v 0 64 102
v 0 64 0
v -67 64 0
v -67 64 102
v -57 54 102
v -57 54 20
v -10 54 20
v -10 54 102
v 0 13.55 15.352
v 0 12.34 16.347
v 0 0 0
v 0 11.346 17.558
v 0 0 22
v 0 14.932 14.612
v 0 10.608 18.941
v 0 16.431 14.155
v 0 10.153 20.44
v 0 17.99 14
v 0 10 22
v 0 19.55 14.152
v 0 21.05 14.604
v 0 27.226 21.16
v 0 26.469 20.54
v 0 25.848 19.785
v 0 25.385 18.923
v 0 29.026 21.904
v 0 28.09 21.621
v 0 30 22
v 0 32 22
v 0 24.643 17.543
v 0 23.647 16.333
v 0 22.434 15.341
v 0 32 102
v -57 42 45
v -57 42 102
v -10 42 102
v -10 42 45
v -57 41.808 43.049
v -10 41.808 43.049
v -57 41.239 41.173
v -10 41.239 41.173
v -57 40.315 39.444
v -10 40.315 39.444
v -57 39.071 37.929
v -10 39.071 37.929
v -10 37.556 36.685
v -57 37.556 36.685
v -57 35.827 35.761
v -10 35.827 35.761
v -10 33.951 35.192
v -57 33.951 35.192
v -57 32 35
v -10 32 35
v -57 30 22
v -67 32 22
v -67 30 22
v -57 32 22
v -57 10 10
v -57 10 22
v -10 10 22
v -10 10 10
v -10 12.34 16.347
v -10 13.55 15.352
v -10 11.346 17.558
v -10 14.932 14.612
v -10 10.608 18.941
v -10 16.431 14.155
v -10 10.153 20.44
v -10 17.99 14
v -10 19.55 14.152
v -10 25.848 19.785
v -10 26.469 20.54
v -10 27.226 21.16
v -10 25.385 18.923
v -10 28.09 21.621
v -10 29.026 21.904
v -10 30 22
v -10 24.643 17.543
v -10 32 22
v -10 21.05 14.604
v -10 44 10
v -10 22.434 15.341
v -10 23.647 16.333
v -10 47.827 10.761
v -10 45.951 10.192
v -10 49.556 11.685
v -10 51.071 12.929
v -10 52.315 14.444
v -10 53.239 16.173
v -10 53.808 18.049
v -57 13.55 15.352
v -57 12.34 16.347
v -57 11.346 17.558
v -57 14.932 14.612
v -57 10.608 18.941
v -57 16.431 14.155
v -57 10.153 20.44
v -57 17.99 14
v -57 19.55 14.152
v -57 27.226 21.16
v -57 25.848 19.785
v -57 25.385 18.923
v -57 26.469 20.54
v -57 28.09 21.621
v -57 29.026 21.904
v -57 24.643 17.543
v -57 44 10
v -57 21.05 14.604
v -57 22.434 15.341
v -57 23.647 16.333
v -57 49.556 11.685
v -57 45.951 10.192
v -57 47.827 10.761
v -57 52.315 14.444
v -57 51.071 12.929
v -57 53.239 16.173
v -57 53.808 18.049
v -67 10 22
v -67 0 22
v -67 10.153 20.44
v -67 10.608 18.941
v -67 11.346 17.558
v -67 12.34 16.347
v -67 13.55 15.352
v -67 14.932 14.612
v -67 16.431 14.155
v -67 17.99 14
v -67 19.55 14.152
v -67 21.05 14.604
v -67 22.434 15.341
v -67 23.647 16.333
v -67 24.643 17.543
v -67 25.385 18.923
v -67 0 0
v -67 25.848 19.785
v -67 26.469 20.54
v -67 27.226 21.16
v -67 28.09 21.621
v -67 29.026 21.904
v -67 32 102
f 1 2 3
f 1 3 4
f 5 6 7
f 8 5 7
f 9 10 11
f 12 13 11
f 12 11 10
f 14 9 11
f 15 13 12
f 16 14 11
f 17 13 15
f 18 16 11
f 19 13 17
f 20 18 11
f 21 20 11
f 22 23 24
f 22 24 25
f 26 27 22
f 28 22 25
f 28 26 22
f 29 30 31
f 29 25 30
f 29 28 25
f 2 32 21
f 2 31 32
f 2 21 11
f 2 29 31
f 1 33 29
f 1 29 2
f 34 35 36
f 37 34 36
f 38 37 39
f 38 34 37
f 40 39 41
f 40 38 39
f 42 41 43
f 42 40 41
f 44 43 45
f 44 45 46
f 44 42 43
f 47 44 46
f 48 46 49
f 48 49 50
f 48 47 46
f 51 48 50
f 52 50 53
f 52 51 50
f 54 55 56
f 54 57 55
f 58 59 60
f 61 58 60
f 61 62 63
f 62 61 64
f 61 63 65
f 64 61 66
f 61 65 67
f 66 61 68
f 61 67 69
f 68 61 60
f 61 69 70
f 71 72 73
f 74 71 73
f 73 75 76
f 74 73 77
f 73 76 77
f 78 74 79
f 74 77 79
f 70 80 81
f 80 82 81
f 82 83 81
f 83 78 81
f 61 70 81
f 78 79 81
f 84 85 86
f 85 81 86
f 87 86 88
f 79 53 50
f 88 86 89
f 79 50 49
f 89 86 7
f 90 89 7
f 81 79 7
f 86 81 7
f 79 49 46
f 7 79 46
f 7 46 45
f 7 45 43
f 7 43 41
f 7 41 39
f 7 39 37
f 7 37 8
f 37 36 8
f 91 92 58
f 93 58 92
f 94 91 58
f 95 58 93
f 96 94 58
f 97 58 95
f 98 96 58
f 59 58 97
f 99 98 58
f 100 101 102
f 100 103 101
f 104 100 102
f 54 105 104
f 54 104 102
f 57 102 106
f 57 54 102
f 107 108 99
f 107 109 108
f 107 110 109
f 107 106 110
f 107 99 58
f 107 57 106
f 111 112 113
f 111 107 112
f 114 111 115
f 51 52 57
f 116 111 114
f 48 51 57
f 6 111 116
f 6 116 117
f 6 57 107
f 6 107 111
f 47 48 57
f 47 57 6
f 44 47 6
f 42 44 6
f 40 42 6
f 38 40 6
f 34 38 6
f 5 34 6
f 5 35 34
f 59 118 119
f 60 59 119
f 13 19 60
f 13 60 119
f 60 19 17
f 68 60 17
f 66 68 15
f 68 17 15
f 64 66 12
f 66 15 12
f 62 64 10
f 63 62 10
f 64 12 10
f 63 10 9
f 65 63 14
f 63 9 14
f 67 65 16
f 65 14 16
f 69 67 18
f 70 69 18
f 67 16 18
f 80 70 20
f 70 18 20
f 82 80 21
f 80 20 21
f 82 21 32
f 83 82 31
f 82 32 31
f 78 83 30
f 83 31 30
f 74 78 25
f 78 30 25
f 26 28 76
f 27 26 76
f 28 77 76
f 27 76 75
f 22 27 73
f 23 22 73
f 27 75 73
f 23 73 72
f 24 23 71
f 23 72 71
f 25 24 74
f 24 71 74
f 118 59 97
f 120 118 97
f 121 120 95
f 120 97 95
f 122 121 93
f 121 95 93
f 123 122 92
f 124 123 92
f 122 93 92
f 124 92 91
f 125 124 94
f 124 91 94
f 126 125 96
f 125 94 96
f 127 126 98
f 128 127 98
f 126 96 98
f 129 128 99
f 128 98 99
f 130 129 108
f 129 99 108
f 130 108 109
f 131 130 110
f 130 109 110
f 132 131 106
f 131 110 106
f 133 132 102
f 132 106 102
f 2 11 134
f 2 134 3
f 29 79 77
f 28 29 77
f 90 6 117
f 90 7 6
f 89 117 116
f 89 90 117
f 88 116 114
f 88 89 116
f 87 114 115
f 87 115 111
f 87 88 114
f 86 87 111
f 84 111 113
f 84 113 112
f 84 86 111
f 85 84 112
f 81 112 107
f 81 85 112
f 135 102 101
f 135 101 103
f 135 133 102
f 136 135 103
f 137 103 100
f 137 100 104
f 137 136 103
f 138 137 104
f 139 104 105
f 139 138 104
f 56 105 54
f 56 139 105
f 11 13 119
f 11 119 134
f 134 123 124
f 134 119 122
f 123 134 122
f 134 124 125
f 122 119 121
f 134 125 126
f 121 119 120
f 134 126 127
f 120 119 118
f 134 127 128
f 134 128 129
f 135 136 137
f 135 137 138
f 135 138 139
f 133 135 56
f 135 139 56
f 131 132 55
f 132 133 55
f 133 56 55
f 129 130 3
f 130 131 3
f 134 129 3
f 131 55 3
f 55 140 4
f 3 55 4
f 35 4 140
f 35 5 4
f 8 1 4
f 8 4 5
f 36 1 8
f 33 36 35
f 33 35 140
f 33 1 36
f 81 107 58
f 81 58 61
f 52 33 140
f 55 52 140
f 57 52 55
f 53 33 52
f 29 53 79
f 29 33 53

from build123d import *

# Parameters (mm, degrees)
F1_DEPTH  = 67
F2_W      = 47
F2_H      = 12
F3_DEPTH  = 92
F4_DEPTH  = 92
F5_W      = 47
F5_H      = 22
F6_DEPTH  = 12
F8_DEPTH  = 22
F9_R      = 9.99999
F11_DEPTH = 83
F12_R     = 5


# Not quite as in the source:
# - a fillet or chamfer is up to 0.001 mm smaller than in the source, because OpenCascade refuses the exact size


with BuildPart() as f1:
    # F0 (on Right) → F1 (new body)
    with BuildSketch(Plane.YZ):
        Polygon((0, 22), (0, 0), (64, 0), (64, 22), (64, 102), (32, 102), (32, 22), align=None)
    extrude(amount=-F1_DEPTH)

    # F2 (on face) → F3 (join)
    with BuildSketch(Plane.XY.offset(102)):
        with Locations((-33.5, 48)):
            Rectangle(F2_W, F2_H)
    extrude(amount=-F3_DEPTH)

    # F2 (on face) → F4 (cut)
    with BuildSketch(Plane.XY.offset(102)):
        with Locations((-33.5, 48)):
            Rectangle(F2_W, F2_H)
    extrude(amount=-F4_DEPTH, mode=Mode.SUBTRACT)

    # F5 (on face) → F6 (cut)
    with BuildSketch(Plane.XY.offset(22)):
        with Locations((-33.5, 21)):
            Rectangle(F5_W, F5_H)
    extrude(amount=-F6_DEPTH, mode=Mode.SUBTRACT)

    # F7 (on face) → F8 (cut)
    with BuildSketch(Plane.XZ.offset(-32)):
        Polygon((-57, 22), (-57, 10), (-10, 10), (-10, 22), (-10, 35), (-57, 35), align=None)
    extrude(amount=-F8_DEPTH, mode=Mode.SUBTRACT)

    # F9 (radius 10 in the source; OpenCascade refuses exactly that, so slightly less here)
    f9_edges = [f1.edges().sort_by_distance(p)[0] for p in [
        (-33.5, 54, 10),
        (-33.5, 42, 35),
    ]]
    fillet(f9_edges, radius=F9_R)

    # F10 (on face) → F11 (cut)
    with BuildSketch(Plane.YZ):
        with BuildLine():
            ThreePointArc((10, 22), (18, 14), (26, 22))
            Line((26, 22), (10, 22))
        make_face()
    extrude(amount=-F11_DEPTH, mode=Mode.SUBTRACT)

    # F12
    f12_edges = [f1.edges().sort_by_distance(p)[0] for p in [
        (-5, 26, 22),
        (-62, 26, 22),
    ]]
    fillet(f12_edges, radius=F12_R)


solid = f1.part
